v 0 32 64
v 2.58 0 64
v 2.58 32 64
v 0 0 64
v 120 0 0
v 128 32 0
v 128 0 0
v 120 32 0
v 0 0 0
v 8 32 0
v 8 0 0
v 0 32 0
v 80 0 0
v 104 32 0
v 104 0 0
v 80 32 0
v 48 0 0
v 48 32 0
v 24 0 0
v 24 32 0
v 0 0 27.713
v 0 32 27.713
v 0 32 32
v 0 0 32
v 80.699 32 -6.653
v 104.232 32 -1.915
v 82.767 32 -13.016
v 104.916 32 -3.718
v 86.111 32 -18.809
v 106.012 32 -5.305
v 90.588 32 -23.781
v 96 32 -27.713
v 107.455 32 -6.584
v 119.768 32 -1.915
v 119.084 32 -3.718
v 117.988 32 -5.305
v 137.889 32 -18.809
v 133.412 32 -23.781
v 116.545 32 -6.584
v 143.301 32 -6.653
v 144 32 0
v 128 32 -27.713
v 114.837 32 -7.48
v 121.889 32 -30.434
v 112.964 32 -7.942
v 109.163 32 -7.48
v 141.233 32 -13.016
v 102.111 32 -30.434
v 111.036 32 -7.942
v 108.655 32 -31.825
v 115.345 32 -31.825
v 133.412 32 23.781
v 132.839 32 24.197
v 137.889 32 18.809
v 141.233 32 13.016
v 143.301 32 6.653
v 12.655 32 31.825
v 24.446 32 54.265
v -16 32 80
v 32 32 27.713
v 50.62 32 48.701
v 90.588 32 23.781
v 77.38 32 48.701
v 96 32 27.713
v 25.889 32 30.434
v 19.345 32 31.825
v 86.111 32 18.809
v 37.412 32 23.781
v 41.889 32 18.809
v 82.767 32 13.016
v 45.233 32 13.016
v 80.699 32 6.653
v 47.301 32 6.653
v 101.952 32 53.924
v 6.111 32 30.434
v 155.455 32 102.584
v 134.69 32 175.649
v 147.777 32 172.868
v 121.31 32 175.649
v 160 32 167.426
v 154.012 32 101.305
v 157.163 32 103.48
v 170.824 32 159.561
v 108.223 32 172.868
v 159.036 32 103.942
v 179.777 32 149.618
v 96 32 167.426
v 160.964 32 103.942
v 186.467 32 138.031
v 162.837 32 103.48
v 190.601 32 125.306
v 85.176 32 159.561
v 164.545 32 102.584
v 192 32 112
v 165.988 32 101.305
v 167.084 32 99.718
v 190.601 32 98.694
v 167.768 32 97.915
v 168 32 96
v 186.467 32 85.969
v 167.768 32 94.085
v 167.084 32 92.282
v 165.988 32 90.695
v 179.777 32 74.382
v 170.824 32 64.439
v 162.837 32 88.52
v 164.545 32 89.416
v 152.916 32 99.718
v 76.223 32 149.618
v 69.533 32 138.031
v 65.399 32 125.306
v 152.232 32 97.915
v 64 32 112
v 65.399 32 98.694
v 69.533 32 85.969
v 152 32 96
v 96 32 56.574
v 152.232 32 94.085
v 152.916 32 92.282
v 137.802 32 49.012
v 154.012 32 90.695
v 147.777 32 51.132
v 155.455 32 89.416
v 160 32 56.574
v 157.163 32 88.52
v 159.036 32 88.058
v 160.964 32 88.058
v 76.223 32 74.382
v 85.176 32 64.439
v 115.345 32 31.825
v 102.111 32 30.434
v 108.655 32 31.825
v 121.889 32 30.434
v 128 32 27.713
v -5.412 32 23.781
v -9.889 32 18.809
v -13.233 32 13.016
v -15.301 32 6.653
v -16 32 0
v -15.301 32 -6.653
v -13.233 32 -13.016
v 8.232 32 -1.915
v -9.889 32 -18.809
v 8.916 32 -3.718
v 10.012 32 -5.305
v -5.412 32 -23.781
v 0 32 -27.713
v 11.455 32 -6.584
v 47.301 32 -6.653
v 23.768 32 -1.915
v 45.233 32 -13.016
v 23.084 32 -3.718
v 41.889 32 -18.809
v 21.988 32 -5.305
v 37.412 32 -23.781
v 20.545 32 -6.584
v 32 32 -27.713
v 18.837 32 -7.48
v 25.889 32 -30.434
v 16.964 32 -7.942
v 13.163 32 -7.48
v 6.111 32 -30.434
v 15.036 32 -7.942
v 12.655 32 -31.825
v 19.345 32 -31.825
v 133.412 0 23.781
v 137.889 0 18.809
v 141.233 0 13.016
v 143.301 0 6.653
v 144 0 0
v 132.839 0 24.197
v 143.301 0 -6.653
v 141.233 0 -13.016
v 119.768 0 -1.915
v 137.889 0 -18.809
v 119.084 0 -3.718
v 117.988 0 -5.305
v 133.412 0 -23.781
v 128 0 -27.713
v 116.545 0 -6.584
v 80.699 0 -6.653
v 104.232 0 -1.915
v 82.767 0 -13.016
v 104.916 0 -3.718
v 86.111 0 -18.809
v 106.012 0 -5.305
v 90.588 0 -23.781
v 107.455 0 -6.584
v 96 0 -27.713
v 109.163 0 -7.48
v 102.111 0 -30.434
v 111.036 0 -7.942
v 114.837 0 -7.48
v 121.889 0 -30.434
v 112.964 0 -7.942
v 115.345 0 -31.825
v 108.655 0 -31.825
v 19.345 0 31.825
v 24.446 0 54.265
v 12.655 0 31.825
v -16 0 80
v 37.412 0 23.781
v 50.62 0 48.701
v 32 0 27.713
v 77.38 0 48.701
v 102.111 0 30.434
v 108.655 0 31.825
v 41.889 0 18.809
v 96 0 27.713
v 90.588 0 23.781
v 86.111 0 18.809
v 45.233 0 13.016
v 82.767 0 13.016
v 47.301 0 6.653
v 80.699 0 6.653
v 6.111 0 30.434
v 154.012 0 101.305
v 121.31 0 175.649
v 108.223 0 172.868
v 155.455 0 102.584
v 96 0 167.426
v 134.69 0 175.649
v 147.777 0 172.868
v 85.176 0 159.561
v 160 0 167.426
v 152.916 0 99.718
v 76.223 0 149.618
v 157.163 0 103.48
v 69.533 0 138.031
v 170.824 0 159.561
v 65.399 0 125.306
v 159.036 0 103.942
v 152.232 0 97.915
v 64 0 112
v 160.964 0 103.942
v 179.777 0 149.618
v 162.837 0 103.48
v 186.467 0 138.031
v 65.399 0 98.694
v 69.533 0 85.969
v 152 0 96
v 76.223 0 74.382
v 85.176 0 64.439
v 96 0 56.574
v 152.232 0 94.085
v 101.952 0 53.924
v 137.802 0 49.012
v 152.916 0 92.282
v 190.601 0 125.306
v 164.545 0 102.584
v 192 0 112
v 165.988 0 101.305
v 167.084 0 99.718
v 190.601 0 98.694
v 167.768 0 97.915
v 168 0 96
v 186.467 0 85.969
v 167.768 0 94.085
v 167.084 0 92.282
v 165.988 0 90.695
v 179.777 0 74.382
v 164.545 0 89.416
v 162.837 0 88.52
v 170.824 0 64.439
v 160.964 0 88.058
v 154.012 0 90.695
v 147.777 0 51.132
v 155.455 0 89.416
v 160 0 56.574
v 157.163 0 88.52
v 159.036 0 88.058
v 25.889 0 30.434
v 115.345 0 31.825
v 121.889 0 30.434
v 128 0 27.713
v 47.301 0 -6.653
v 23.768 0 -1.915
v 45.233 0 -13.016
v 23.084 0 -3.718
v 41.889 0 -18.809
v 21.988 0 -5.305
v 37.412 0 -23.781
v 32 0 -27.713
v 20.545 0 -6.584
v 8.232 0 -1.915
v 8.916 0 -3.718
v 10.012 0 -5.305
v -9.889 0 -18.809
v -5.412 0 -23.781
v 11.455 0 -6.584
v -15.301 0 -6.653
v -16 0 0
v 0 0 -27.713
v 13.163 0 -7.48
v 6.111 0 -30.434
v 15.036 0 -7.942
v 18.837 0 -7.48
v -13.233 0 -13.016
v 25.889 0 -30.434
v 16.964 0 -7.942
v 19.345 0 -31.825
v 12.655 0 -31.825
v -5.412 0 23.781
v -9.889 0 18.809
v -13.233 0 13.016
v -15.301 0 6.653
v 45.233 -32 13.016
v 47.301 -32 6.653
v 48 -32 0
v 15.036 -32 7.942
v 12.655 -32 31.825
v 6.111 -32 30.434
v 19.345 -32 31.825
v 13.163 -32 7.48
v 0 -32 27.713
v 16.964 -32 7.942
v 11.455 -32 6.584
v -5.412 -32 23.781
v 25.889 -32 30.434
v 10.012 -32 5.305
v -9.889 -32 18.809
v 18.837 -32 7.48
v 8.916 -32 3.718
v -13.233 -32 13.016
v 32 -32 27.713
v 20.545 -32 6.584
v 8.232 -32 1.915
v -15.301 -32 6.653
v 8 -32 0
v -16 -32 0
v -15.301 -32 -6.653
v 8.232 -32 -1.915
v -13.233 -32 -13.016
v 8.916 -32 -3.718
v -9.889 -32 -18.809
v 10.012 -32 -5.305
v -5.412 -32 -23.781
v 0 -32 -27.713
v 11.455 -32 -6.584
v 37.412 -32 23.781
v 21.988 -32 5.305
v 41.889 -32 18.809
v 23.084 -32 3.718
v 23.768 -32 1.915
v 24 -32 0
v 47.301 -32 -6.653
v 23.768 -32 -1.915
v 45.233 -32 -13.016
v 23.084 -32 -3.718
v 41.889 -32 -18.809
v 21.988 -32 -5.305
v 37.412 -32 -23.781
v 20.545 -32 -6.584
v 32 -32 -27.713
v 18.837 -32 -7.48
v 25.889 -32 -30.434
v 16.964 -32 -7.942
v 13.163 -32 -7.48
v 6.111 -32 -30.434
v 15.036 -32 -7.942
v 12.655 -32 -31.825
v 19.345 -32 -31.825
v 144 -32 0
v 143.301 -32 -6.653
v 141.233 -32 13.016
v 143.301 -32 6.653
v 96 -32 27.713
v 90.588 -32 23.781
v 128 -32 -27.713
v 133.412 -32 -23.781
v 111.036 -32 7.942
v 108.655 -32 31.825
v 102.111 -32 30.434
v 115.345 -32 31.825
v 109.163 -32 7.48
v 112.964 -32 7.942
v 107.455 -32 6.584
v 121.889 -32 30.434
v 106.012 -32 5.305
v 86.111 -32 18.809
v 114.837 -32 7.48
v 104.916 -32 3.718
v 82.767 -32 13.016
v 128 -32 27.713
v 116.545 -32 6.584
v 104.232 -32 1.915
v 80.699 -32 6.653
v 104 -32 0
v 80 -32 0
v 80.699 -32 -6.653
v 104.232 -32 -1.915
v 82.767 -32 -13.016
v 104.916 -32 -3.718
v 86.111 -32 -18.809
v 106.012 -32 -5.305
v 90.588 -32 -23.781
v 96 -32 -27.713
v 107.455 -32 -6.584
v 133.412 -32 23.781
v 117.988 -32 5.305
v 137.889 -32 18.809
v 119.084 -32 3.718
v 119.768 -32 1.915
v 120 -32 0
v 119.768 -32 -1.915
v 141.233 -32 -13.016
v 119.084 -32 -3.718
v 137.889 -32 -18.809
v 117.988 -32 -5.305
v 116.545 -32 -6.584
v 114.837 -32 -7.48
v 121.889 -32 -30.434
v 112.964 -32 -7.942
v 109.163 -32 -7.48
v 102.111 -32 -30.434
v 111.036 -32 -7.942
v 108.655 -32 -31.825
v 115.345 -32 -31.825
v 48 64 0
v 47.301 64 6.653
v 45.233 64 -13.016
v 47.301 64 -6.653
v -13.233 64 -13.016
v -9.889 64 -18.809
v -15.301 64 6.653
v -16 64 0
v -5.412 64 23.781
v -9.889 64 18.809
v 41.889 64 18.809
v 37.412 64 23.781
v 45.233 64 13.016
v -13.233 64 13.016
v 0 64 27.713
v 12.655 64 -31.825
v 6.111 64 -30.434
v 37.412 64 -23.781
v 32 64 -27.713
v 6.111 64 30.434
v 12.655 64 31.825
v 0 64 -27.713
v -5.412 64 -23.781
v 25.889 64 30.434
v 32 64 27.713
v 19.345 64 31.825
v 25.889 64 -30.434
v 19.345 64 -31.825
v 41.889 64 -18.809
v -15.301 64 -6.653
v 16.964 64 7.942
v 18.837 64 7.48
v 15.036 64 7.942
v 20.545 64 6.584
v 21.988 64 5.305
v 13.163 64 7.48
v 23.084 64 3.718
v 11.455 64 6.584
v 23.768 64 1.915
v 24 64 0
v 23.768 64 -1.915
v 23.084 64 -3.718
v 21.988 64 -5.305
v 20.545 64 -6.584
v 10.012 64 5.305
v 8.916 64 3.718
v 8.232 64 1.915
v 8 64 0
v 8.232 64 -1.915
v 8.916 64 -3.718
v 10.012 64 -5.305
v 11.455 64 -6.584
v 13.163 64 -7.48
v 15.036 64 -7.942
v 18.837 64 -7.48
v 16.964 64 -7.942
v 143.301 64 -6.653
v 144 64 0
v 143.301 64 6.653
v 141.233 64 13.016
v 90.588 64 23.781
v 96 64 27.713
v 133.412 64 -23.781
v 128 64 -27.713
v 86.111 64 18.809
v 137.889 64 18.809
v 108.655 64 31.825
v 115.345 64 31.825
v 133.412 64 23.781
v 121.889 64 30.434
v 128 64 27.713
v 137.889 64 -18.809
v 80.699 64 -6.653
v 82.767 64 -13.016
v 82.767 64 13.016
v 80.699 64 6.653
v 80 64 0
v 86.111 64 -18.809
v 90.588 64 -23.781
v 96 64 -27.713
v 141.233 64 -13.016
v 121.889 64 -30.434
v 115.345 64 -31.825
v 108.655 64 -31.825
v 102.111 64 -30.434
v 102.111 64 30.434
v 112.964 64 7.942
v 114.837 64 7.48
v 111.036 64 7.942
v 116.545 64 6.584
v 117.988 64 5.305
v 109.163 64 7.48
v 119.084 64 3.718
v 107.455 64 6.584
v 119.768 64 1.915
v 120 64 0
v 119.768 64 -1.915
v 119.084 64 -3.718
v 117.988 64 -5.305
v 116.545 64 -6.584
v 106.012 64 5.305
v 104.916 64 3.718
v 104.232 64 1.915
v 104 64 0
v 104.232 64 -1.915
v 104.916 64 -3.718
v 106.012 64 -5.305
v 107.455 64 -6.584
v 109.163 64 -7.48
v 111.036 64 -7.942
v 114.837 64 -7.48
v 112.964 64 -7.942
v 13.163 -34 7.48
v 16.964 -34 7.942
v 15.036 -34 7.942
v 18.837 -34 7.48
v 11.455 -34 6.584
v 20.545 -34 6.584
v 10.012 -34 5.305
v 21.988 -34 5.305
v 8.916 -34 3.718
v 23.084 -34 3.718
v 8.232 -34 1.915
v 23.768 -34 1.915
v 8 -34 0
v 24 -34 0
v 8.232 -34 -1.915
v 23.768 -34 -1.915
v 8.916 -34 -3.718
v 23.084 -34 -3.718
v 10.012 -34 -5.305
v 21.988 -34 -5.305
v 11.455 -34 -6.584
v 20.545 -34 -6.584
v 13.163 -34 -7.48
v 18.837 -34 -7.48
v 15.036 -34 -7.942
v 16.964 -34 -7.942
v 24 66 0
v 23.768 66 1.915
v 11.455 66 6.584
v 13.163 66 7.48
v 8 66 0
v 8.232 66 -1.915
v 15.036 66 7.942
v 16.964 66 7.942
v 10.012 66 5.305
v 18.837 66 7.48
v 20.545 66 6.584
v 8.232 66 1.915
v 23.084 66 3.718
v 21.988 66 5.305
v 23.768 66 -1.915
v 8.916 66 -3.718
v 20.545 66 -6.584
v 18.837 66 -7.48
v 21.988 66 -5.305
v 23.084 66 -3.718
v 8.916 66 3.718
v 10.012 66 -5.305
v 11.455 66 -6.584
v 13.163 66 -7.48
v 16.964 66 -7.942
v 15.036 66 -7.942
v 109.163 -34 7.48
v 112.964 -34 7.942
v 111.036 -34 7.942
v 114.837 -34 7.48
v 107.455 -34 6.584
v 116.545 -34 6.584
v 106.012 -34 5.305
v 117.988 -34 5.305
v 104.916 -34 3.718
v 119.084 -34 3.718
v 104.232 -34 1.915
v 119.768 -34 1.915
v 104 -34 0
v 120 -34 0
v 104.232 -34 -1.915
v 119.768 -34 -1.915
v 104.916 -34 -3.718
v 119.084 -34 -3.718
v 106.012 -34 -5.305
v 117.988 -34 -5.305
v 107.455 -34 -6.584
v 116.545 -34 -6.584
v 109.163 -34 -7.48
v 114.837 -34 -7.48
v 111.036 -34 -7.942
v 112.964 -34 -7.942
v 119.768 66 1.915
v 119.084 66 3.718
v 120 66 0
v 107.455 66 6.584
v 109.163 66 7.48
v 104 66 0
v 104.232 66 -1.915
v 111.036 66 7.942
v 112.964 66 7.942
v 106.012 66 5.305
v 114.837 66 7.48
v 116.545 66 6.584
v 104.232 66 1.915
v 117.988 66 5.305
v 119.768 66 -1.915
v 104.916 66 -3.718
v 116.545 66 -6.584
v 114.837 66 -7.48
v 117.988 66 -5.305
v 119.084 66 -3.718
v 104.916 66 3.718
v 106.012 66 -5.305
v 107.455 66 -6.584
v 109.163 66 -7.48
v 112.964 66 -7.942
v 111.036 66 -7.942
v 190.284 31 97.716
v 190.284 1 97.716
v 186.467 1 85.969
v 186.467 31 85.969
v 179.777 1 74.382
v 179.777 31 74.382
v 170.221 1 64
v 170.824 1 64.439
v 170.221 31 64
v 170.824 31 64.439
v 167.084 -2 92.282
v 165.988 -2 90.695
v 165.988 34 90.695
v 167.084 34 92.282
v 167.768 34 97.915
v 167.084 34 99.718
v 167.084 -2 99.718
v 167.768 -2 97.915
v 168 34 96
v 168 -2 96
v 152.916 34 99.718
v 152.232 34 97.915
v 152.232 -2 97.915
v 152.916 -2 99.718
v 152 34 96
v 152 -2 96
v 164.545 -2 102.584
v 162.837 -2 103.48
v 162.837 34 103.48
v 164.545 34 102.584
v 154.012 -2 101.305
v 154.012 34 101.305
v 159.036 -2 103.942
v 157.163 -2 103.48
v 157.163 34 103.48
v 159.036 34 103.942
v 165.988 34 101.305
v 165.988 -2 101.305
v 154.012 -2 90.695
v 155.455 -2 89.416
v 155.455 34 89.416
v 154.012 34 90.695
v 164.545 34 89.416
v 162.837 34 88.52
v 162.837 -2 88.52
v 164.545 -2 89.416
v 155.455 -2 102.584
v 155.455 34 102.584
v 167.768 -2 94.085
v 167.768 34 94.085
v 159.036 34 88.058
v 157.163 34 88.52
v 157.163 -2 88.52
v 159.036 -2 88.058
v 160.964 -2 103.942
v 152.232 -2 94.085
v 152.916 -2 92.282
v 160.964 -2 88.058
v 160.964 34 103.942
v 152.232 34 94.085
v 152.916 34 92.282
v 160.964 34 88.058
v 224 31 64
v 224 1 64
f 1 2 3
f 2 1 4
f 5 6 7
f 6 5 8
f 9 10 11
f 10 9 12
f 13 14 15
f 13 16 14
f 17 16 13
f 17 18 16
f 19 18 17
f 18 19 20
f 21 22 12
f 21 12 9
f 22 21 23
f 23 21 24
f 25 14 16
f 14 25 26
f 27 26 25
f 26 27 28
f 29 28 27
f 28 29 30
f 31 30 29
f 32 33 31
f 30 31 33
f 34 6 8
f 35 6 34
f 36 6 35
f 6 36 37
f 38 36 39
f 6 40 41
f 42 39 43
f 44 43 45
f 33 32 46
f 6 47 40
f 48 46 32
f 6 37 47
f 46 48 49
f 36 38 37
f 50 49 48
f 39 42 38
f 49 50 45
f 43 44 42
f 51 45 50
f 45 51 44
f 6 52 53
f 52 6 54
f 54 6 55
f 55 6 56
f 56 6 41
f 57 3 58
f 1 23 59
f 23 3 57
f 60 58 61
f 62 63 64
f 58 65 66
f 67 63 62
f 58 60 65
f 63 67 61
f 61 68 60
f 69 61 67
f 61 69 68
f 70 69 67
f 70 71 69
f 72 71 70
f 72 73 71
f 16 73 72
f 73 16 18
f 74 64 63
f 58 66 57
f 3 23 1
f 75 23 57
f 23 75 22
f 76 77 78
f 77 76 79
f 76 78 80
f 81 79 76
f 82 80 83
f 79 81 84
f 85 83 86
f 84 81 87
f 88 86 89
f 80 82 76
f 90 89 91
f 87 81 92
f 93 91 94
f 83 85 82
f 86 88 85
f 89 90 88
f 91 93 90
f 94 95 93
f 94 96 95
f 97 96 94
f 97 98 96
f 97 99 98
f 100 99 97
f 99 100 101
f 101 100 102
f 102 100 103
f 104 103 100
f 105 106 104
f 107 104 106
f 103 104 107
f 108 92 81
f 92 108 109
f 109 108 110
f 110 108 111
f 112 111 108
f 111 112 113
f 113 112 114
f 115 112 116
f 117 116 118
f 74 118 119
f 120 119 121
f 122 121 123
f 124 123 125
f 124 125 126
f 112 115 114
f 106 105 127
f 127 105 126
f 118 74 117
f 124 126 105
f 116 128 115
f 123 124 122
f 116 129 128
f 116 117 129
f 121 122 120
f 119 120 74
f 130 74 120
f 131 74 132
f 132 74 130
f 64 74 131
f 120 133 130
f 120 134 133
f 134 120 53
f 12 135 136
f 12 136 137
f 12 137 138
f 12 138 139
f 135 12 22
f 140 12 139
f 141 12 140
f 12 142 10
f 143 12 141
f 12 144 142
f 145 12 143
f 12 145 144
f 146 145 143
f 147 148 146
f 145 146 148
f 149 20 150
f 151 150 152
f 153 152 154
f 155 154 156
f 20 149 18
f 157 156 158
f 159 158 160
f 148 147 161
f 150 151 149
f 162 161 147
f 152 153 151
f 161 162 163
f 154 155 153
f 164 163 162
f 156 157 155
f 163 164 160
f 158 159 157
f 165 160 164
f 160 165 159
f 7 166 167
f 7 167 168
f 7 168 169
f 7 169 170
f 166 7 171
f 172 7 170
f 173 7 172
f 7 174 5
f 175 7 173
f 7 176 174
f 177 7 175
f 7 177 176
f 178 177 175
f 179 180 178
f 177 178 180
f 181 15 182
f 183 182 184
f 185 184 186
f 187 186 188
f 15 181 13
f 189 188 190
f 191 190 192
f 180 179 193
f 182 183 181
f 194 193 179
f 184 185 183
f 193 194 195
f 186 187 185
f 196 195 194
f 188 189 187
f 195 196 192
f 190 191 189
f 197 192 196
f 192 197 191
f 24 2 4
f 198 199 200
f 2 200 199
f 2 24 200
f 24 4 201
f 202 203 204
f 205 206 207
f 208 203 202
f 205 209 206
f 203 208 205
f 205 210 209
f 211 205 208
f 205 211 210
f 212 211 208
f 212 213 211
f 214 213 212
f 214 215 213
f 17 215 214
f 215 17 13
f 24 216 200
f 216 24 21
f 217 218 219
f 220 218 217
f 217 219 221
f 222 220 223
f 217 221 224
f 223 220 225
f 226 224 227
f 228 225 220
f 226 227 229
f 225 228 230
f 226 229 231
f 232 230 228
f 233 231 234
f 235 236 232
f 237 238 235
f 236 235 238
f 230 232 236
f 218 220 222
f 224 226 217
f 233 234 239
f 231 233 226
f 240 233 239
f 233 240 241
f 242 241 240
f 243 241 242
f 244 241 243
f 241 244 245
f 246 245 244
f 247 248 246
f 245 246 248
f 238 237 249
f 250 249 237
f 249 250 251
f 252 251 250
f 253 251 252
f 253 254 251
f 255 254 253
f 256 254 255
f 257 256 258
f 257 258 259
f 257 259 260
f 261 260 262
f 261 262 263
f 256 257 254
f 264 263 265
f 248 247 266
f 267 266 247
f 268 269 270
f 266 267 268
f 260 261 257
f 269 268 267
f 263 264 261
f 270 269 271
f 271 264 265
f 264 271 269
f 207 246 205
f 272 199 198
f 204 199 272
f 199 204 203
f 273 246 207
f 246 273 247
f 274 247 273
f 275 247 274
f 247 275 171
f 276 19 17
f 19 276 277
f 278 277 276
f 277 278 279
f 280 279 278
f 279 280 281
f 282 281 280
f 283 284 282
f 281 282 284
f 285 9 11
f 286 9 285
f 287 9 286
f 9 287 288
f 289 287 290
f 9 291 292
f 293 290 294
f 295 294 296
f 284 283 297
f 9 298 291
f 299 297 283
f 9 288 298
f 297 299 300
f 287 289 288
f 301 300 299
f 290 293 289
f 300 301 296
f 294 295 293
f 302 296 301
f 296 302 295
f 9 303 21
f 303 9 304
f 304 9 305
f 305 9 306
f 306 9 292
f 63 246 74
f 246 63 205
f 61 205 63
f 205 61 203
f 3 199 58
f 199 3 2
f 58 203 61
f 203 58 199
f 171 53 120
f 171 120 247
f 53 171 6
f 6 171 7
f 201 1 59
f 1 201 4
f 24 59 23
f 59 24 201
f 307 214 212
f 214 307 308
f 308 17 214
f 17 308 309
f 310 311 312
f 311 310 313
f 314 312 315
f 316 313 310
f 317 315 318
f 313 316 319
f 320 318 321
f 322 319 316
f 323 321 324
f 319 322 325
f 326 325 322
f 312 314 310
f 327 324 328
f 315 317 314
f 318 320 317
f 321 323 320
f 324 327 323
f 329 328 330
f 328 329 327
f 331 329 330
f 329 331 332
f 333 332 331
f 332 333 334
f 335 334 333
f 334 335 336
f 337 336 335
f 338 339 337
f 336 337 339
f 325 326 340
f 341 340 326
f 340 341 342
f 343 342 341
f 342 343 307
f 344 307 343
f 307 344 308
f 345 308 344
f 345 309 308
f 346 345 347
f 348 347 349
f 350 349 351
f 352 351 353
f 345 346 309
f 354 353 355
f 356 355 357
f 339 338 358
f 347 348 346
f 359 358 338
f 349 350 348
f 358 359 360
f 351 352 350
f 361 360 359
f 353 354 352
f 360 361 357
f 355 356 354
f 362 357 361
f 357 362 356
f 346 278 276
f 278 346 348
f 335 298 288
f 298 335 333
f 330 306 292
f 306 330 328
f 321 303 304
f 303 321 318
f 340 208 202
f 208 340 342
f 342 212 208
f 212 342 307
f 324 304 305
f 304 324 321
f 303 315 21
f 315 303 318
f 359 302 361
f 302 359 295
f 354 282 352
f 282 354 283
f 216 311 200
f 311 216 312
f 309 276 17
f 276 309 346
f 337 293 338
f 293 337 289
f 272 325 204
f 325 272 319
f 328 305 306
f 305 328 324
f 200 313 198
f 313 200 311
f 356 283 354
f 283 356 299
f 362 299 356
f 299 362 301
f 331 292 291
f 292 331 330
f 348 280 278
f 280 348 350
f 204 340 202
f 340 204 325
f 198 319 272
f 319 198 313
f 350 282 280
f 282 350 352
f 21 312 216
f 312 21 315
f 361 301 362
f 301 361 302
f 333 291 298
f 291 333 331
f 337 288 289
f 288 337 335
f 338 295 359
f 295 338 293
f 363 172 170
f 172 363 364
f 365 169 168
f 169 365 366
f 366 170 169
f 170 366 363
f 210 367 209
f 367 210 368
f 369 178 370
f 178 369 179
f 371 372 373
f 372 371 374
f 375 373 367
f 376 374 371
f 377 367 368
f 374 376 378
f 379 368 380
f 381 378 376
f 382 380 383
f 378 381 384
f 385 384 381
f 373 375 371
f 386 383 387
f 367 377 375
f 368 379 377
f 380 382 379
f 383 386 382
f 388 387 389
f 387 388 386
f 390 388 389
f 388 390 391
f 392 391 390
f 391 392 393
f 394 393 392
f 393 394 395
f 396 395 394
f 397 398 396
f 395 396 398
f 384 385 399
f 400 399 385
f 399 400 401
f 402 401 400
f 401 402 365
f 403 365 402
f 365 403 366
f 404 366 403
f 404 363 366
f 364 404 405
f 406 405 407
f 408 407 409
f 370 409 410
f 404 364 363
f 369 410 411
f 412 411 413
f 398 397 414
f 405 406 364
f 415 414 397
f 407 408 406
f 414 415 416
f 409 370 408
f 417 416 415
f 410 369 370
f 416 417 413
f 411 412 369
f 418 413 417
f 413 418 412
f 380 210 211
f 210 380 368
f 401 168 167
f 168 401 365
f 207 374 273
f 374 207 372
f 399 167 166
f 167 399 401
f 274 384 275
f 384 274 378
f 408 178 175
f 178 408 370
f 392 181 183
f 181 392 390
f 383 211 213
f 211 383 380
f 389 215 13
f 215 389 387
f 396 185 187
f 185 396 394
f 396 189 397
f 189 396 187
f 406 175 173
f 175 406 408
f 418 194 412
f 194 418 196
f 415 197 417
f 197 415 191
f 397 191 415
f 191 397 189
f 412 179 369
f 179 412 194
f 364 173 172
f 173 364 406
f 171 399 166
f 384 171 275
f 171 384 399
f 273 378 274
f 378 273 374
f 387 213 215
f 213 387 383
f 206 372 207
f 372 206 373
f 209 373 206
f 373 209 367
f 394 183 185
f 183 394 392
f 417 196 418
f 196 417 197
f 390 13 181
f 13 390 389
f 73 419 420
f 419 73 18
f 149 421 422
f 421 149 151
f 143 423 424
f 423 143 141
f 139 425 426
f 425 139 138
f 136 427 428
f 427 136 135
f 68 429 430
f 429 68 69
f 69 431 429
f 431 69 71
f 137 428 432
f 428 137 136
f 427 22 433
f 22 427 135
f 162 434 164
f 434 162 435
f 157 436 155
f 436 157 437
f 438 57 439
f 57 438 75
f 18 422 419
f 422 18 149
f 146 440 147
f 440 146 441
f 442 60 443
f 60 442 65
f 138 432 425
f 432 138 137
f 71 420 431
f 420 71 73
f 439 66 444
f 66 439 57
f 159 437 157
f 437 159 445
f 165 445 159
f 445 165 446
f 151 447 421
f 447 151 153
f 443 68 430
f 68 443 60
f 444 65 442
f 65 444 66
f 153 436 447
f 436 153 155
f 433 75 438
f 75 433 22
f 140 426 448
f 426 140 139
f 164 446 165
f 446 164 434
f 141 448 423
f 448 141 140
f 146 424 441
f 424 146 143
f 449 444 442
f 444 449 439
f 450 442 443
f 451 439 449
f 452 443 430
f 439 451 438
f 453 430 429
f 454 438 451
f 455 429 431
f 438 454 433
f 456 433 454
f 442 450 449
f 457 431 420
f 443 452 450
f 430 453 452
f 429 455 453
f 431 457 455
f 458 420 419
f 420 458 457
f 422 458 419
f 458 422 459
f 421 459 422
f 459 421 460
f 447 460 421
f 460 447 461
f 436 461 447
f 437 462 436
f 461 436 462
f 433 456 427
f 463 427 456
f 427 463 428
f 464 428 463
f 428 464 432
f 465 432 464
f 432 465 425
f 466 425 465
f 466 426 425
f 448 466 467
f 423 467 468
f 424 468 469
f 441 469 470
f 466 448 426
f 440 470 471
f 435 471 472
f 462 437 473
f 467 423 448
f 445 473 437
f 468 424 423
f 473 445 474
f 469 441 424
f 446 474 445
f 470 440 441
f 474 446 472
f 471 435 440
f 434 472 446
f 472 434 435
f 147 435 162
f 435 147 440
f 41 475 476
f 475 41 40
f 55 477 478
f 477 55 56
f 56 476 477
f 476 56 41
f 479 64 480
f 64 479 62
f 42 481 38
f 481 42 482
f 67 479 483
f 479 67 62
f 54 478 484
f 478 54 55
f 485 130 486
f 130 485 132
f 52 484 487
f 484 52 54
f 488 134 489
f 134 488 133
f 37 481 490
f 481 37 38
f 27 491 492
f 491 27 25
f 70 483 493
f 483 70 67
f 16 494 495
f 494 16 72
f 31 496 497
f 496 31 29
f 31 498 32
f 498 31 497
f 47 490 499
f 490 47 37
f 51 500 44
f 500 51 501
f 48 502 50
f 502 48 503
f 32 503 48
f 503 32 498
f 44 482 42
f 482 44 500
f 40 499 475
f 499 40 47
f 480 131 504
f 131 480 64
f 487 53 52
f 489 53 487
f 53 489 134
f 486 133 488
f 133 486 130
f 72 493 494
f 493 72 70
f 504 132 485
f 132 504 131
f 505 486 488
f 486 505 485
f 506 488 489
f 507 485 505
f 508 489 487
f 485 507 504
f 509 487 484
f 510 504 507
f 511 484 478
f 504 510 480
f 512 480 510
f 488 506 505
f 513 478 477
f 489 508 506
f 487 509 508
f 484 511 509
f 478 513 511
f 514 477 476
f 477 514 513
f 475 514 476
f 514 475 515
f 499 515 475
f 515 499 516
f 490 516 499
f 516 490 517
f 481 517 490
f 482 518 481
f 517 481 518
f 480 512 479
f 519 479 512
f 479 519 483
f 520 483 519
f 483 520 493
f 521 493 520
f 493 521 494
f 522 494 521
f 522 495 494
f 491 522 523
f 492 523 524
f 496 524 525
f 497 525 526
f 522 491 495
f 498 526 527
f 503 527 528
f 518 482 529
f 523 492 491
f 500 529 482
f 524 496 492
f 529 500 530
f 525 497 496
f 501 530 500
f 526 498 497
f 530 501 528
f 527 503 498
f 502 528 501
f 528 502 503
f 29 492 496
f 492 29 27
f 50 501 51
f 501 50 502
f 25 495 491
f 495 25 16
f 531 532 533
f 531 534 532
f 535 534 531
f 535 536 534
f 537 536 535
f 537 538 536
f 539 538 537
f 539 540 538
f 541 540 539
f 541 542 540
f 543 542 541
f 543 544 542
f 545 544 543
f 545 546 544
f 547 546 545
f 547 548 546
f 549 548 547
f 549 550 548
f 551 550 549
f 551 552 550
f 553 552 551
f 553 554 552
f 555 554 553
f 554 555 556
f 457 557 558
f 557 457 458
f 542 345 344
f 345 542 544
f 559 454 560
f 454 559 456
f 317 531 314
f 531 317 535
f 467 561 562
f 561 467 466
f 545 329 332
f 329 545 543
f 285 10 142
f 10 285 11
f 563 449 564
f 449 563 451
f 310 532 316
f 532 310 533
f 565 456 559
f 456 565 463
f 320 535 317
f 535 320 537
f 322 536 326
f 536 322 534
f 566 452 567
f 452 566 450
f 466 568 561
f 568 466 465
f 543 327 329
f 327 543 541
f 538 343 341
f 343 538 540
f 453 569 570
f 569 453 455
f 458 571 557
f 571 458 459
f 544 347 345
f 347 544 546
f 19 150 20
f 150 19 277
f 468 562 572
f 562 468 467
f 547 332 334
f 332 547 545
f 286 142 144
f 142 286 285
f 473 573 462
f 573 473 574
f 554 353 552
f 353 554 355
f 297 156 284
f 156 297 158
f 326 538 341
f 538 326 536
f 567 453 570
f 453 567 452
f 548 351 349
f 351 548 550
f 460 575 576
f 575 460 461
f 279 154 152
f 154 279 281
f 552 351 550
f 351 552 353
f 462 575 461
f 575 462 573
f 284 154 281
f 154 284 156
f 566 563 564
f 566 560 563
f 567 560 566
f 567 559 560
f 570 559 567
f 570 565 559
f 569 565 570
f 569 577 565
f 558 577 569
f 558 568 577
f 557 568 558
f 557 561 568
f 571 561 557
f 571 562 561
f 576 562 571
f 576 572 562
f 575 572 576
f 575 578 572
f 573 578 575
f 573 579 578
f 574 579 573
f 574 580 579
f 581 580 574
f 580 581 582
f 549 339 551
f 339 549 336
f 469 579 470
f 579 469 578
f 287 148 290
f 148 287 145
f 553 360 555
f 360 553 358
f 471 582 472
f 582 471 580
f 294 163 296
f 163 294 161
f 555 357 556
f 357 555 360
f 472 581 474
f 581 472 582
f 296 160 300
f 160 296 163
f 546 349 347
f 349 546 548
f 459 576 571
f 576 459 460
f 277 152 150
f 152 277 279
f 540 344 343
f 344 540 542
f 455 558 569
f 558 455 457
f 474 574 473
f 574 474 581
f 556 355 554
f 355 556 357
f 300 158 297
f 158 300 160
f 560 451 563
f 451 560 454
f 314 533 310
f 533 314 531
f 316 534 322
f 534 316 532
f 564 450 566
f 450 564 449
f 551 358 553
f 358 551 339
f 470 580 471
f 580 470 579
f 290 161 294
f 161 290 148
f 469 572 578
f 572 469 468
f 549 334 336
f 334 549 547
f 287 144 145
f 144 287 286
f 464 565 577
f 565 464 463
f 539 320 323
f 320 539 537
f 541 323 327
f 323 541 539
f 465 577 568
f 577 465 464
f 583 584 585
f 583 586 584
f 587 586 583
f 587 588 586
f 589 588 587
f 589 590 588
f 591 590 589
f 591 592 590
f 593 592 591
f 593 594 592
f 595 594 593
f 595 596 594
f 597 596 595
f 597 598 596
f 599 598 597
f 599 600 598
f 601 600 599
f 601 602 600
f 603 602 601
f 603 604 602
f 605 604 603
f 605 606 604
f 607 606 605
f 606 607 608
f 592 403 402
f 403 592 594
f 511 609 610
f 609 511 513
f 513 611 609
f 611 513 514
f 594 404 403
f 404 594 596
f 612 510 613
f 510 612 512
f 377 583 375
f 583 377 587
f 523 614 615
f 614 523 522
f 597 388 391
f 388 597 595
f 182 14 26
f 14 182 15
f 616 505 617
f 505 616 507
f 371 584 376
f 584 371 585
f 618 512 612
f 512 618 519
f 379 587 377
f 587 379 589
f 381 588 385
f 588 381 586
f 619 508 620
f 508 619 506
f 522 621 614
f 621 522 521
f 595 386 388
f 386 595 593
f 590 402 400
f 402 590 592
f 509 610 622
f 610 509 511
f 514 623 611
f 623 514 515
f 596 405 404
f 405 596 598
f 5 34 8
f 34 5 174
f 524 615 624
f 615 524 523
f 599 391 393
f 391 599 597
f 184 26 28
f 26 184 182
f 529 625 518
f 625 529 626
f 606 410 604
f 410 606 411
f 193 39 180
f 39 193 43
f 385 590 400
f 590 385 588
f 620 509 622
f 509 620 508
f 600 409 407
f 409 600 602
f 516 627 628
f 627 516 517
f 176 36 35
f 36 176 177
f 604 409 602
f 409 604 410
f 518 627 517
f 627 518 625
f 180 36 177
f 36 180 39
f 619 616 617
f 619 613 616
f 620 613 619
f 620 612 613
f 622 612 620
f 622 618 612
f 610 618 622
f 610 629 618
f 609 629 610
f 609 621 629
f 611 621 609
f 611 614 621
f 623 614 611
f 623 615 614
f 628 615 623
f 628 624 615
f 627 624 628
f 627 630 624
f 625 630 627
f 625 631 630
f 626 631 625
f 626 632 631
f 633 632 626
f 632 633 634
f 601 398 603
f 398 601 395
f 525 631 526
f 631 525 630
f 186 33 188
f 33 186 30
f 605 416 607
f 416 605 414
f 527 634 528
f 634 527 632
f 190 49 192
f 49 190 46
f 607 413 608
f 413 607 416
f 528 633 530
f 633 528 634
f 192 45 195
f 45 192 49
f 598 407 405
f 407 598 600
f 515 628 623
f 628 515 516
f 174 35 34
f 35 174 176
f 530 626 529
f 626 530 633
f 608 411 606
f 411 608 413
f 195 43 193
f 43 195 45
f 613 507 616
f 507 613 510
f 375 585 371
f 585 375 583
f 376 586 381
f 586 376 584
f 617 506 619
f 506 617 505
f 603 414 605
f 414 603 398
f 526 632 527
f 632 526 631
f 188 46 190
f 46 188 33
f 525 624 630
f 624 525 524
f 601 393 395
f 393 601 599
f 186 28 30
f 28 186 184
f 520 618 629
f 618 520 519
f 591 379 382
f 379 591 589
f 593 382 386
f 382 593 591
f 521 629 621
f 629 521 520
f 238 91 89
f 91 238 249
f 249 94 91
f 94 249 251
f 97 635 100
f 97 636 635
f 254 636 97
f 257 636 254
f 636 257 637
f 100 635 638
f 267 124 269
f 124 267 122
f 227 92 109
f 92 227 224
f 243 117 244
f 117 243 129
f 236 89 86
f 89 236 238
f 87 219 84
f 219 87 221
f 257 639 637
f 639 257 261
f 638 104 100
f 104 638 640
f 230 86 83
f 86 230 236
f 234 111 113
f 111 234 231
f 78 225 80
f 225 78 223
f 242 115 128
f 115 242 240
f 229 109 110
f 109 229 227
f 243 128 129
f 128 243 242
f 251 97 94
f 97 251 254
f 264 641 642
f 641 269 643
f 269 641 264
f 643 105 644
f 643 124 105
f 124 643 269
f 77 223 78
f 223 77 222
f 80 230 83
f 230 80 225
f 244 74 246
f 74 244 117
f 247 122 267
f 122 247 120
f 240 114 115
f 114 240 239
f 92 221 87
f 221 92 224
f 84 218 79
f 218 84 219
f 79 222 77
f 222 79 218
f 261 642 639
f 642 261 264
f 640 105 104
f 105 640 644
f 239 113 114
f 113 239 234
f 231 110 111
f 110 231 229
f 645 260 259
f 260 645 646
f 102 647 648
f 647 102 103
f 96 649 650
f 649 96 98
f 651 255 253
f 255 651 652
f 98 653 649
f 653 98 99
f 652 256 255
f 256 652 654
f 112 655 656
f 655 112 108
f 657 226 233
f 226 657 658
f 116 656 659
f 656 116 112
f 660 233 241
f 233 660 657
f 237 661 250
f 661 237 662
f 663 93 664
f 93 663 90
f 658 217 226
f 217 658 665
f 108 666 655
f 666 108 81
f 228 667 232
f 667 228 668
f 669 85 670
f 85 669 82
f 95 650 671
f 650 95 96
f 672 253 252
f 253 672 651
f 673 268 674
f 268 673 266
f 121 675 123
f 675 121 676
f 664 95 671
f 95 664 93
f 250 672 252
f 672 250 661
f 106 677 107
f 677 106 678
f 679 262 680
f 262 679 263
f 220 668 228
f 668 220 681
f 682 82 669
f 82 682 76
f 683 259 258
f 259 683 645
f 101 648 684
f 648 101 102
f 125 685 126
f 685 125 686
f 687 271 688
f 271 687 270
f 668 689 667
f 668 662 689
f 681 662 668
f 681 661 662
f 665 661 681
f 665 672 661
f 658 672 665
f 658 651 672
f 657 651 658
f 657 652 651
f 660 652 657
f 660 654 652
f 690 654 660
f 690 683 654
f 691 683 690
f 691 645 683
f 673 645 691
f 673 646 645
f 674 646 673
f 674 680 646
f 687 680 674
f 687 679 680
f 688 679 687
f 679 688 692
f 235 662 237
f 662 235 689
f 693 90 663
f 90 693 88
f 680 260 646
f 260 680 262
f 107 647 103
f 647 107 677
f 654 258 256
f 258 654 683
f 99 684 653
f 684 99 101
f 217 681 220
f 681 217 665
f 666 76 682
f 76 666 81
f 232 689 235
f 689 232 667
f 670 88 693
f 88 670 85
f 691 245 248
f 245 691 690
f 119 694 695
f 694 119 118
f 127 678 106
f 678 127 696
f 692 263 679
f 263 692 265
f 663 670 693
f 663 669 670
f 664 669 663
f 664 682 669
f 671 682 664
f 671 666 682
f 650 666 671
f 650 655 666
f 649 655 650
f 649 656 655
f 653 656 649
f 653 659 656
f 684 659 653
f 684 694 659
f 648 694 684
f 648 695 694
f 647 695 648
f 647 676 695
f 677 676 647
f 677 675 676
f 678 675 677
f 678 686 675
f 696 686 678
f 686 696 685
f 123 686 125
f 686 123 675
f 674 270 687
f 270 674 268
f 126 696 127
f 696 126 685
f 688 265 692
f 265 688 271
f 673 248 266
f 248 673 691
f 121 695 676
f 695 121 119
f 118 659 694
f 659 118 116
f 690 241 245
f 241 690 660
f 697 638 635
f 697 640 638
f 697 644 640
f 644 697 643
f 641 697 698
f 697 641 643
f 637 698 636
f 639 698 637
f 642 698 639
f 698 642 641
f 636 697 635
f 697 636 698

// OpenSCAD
wheel_color="#00D5FF"; // default: "#00D5FF"
axle_color="#D53963"; // default: "#D53963"
body_color="#FFD500"; // default: "#FFD500"
eye_color="#000000"; // default: "#000000
beak_color="#FF3C00"; // default: "#FF0000
opacity=1; // default: 1

wheel_radius=32; // default: 32
wheel_width=32; // default: 8
wheel_margin=16; // default: 16
axle_radius=8; // default: 8
body_width=32; // default: 32
body_length=128; // default: 128
body_height=64; // default: 64
head_radius=body_height; // default: body_height
eye_radius=8; // default: 8

// Raeder
color(wheel_color, opacity) 
    translate([wheel_margin, -wheel_width/2, 0]) 
    rotate([90, 0, 0]) 
    cylinder(h=wheel_width, r=wheel_radius, center=true);
color(wheel_color, opacity) 
    translate([body_length - wheel_margin, -wheel_width/2, 0]) 
    rotate([90, 0, 0]) 
    cylinder(h=wheel_width, r=wheel_radius, center=true);
color(wheel_color, opacity) 
    translate([wheel_margin, body_width + wheel_width/2, 0]) 
    rotate([90, 0, 0]) 
    cylinder(h=wheel_width, r=wheel_radius, center=true);
color(wheel_color, opacity) 
    translate([body_length - wheel_margin, body_width + wheel_width/2, 0]) 
    rotate([90, 0, 0]) 
    cylinder(h=wheel_width, r=wheel_radius, center=true);

// Achsen
color(axle_color, opacity) 
    translate([wheel_margin, body_width/2, 0]) 
    rotate([90, 0, 0]) 
    cylinder(h=body_width + 2*wheel_width + axle_radius/2, r=axle_radius, center=true);
color(axle_color, opacity)
    translate([body_length - wheel_margin, body_width/2, 0]) 
    rotate([90, 0, 0]) 
    cylinder(h=body_width + 2*wheel_width + axle_radius/2, r=axle_radius, center=true);


// Koerper
union() {
    difference() {
        color (body_color, opacity) 
            cube([body_length, body_width, body_height]);
        color (body_color, opacity)
            translate([body_length/2, body_width/2, body_height+body_length-body_length/8])
            rotate([90, 0, 0])
            cylinder(r=body_length, h=body_width * 2, center=true);
    }
    color(body_color, opacity) 
        translate([0, body_width/2, 0]) 
        rotate([90, 0, 0]) 
        linear_extrude(height=body_width, center=true, convexity=10)
        polygon(points=[[body_length/2, 0], [body_length, 0], [body_length+16, body_height+16]]);
    color(body_color, opacity) 
        translate([0, body_width/2, 0]) 
        rotate([90, 0, 0]) 
        linear_extrude(height=body_width, center=true, convexity=10)
        polygon(points=[[0, body_height/2], [body_length/2, 0], [-body_length/8, body_height+body_height/4]]);
}


// Kopf
color(body_color, opacity) 
    translate([body_length, body_width / 2, body_height +  body_height -16]) 
    rotate([90, 0, 0]) 
    cylinder(h=body_width, r=head_radius, center=true);
color(eye_color, opacity)
    translate([body_length + head_radius/2, body_width/2, body_height+body_height/2]) 
    rotate([90, 0, 0]) 
    cylinder(h=body_width + eye_radius/2, r=eye_radius, center=true);

// Schnabel
color(beak_color, opacity) 
    translate([body_length+head_radius-head_radius/2, body_width/2, body_height+head_radius]) 
    rotate([90, 90, 0]) 
    linear_extrude(height=body_width-2, center=true, convexity=10)
    polygon(points=[[0, 0], [body_height, 0], [body_height, body_height]]);
